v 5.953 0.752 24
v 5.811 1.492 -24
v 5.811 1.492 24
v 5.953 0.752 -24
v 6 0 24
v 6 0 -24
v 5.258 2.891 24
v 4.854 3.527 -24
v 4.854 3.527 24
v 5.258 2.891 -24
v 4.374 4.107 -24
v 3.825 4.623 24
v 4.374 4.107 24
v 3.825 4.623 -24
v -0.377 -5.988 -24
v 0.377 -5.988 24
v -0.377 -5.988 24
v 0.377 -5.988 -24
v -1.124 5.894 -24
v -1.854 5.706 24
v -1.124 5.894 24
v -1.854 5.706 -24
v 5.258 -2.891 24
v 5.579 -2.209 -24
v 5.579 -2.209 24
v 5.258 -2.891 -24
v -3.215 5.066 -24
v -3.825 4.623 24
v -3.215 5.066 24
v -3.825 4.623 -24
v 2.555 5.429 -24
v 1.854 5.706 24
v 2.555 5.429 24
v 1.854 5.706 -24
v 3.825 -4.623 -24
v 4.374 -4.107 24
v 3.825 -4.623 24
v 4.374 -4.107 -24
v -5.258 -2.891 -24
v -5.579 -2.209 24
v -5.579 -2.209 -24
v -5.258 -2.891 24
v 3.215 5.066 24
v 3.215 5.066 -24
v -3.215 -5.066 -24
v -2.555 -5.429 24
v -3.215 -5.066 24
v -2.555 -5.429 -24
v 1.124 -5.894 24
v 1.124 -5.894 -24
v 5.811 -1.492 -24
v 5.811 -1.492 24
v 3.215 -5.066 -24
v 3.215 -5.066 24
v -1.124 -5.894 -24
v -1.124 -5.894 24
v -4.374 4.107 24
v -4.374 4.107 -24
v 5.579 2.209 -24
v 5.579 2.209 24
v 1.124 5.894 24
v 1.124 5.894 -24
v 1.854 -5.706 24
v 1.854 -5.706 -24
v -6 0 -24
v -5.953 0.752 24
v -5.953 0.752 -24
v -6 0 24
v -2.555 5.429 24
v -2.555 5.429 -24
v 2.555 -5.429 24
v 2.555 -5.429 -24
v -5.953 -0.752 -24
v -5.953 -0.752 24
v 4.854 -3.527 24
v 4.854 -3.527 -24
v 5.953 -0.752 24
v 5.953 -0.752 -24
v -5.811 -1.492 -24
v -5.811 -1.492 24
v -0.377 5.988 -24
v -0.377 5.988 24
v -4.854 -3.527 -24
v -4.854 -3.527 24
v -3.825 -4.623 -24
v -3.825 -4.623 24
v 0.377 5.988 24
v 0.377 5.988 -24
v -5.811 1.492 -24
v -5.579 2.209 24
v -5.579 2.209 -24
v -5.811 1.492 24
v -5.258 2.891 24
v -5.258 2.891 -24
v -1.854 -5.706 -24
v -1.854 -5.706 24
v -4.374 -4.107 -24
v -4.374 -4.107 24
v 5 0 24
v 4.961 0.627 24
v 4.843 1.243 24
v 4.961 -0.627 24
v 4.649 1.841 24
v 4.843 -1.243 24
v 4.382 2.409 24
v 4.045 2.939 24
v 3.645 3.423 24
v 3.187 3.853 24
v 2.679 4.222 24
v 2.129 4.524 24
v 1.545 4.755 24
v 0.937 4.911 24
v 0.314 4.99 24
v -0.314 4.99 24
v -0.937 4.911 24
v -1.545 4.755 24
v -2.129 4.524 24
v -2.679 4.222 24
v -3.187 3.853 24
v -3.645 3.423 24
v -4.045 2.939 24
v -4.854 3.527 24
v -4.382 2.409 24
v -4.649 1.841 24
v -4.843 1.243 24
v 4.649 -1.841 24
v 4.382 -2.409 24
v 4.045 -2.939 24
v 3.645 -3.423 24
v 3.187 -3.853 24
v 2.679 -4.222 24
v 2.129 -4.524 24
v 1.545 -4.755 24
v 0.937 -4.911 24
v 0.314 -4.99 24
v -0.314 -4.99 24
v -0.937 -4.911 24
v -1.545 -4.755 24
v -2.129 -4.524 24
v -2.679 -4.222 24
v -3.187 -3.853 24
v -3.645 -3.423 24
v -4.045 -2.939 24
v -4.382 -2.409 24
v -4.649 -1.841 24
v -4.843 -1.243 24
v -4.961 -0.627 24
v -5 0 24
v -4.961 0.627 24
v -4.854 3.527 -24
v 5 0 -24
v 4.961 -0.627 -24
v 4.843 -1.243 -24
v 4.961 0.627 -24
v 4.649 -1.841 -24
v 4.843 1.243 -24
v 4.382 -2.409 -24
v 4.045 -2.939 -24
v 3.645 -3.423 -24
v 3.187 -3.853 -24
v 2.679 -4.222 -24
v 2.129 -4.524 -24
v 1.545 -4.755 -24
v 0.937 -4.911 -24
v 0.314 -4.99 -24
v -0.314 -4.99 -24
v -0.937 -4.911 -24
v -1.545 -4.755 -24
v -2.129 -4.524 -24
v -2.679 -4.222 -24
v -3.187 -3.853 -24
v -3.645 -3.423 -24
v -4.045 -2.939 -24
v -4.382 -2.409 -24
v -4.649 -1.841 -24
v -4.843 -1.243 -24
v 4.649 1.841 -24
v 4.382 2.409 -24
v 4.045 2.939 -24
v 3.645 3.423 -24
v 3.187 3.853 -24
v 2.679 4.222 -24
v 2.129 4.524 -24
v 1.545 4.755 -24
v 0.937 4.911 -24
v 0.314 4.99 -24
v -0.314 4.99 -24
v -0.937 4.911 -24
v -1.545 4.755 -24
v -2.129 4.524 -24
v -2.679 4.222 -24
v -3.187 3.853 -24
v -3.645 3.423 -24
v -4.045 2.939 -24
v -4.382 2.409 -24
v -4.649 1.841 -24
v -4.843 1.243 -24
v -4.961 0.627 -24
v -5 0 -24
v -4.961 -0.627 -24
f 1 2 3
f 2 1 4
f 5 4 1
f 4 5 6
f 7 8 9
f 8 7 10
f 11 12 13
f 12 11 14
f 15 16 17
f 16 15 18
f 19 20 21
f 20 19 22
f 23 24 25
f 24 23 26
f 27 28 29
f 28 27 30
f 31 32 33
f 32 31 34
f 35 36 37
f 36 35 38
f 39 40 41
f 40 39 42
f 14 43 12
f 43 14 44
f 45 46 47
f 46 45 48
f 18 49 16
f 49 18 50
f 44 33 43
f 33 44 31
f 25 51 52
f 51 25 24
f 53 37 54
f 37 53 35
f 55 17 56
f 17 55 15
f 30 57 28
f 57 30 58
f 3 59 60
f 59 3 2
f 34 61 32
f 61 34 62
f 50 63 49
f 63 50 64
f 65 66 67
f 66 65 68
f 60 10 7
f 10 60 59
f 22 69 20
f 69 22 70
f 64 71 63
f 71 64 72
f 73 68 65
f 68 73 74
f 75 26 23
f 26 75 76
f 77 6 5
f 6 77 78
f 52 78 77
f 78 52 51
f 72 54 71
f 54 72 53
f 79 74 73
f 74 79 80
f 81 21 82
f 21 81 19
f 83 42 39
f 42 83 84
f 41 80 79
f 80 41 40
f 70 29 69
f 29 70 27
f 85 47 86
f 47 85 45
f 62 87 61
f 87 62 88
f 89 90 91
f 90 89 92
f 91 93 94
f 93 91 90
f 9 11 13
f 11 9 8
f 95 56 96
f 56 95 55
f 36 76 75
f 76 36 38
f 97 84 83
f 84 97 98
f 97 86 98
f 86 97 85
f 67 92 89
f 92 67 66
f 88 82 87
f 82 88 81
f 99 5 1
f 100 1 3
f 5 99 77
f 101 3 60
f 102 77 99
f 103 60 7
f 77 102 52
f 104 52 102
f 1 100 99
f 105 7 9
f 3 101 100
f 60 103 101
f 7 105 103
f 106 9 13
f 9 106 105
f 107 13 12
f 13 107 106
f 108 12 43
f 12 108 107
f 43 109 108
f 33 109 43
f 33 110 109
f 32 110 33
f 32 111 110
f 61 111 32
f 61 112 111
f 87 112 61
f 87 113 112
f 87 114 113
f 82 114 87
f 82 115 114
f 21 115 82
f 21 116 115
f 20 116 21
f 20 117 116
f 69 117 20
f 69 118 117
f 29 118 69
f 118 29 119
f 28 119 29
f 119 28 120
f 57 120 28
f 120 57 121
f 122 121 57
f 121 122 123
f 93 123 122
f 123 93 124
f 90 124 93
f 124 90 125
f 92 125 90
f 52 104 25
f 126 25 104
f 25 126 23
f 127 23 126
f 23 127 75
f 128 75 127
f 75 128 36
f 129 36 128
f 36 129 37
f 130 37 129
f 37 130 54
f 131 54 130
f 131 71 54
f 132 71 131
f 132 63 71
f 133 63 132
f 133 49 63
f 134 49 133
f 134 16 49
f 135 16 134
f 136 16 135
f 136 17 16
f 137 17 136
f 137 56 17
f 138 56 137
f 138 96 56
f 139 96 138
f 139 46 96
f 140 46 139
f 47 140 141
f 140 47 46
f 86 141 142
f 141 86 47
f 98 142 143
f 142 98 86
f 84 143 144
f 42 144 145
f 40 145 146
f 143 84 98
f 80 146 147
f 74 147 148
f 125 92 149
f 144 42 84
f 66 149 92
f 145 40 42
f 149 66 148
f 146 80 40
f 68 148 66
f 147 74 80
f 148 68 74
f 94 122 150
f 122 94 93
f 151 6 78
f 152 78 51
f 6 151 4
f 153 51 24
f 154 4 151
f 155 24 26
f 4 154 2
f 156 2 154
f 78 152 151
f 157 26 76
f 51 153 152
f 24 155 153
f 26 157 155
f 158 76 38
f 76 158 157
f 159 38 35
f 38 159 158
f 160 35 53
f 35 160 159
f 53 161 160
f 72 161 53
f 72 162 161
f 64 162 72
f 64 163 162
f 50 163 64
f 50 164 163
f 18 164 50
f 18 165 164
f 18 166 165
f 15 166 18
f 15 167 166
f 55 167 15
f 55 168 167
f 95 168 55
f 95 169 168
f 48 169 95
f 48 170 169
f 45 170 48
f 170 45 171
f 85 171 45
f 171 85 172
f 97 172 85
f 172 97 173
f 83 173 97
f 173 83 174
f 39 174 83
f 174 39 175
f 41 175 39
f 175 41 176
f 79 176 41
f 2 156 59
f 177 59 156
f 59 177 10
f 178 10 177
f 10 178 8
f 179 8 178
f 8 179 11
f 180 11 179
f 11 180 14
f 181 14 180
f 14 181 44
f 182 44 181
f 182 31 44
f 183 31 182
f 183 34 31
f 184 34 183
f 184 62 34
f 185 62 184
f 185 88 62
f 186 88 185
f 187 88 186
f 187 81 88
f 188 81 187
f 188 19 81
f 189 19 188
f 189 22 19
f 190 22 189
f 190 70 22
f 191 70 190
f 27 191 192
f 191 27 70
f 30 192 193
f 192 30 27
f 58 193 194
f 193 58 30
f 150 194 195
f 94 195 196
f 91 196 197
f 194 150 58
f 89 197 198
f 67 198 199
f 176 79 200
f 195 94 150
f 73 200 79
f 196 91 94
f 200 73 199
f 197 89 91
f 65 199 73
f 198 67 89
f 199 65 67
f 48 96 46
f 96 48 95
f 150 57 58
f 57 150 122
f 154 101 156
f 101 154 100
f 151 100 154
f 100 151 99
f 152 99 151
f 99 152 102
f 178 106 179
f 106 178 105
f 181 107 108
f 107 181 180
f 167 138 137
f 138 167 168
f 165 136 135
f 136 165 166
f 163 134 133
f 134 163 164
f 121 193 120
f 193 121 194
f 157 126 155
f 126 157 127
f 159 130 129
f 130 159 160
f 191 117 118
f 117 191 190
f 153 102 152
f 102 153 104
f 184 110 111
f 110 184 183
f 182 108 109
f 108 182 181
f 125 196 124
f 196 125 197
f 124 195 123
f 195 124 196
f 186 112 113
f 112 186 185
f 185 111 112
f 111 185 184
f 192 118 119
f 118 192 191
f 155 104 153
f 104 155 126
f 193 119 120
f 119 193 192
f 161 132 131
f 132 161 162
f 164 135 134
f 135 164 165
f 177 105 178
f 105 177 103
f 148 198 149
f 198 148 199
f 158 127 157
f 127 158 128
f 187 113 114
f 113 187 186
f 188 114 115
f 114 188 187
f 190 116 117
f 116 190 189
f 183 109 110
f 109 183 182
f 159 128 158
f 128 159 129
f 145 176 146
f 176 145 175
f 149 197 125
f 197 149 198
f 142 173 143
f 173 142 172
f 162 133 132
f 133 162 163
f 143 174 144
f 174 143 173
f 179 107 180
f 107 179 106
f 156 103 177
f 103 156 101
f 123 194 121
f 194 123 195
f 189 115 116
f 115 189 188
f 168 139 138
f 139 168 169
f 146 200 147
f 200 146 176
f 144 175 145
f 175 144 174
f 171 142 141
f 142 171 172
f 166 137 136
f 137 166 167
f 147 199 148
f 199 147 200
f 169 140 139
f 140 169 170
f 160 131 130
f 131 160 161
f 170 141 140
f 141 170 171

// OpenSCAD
$fn = 50;


difference() {
	union() {
		translate(v = [0, 0, -24.0000000000]) {
			cylinder(h = 48, r = 6.0000000000);
		}
	}
	union() {
		translate(v = [0, 0, -100.0000000000]) {
			cylinder(h = 200, r = 5.0000000000);
		}
	}
}
